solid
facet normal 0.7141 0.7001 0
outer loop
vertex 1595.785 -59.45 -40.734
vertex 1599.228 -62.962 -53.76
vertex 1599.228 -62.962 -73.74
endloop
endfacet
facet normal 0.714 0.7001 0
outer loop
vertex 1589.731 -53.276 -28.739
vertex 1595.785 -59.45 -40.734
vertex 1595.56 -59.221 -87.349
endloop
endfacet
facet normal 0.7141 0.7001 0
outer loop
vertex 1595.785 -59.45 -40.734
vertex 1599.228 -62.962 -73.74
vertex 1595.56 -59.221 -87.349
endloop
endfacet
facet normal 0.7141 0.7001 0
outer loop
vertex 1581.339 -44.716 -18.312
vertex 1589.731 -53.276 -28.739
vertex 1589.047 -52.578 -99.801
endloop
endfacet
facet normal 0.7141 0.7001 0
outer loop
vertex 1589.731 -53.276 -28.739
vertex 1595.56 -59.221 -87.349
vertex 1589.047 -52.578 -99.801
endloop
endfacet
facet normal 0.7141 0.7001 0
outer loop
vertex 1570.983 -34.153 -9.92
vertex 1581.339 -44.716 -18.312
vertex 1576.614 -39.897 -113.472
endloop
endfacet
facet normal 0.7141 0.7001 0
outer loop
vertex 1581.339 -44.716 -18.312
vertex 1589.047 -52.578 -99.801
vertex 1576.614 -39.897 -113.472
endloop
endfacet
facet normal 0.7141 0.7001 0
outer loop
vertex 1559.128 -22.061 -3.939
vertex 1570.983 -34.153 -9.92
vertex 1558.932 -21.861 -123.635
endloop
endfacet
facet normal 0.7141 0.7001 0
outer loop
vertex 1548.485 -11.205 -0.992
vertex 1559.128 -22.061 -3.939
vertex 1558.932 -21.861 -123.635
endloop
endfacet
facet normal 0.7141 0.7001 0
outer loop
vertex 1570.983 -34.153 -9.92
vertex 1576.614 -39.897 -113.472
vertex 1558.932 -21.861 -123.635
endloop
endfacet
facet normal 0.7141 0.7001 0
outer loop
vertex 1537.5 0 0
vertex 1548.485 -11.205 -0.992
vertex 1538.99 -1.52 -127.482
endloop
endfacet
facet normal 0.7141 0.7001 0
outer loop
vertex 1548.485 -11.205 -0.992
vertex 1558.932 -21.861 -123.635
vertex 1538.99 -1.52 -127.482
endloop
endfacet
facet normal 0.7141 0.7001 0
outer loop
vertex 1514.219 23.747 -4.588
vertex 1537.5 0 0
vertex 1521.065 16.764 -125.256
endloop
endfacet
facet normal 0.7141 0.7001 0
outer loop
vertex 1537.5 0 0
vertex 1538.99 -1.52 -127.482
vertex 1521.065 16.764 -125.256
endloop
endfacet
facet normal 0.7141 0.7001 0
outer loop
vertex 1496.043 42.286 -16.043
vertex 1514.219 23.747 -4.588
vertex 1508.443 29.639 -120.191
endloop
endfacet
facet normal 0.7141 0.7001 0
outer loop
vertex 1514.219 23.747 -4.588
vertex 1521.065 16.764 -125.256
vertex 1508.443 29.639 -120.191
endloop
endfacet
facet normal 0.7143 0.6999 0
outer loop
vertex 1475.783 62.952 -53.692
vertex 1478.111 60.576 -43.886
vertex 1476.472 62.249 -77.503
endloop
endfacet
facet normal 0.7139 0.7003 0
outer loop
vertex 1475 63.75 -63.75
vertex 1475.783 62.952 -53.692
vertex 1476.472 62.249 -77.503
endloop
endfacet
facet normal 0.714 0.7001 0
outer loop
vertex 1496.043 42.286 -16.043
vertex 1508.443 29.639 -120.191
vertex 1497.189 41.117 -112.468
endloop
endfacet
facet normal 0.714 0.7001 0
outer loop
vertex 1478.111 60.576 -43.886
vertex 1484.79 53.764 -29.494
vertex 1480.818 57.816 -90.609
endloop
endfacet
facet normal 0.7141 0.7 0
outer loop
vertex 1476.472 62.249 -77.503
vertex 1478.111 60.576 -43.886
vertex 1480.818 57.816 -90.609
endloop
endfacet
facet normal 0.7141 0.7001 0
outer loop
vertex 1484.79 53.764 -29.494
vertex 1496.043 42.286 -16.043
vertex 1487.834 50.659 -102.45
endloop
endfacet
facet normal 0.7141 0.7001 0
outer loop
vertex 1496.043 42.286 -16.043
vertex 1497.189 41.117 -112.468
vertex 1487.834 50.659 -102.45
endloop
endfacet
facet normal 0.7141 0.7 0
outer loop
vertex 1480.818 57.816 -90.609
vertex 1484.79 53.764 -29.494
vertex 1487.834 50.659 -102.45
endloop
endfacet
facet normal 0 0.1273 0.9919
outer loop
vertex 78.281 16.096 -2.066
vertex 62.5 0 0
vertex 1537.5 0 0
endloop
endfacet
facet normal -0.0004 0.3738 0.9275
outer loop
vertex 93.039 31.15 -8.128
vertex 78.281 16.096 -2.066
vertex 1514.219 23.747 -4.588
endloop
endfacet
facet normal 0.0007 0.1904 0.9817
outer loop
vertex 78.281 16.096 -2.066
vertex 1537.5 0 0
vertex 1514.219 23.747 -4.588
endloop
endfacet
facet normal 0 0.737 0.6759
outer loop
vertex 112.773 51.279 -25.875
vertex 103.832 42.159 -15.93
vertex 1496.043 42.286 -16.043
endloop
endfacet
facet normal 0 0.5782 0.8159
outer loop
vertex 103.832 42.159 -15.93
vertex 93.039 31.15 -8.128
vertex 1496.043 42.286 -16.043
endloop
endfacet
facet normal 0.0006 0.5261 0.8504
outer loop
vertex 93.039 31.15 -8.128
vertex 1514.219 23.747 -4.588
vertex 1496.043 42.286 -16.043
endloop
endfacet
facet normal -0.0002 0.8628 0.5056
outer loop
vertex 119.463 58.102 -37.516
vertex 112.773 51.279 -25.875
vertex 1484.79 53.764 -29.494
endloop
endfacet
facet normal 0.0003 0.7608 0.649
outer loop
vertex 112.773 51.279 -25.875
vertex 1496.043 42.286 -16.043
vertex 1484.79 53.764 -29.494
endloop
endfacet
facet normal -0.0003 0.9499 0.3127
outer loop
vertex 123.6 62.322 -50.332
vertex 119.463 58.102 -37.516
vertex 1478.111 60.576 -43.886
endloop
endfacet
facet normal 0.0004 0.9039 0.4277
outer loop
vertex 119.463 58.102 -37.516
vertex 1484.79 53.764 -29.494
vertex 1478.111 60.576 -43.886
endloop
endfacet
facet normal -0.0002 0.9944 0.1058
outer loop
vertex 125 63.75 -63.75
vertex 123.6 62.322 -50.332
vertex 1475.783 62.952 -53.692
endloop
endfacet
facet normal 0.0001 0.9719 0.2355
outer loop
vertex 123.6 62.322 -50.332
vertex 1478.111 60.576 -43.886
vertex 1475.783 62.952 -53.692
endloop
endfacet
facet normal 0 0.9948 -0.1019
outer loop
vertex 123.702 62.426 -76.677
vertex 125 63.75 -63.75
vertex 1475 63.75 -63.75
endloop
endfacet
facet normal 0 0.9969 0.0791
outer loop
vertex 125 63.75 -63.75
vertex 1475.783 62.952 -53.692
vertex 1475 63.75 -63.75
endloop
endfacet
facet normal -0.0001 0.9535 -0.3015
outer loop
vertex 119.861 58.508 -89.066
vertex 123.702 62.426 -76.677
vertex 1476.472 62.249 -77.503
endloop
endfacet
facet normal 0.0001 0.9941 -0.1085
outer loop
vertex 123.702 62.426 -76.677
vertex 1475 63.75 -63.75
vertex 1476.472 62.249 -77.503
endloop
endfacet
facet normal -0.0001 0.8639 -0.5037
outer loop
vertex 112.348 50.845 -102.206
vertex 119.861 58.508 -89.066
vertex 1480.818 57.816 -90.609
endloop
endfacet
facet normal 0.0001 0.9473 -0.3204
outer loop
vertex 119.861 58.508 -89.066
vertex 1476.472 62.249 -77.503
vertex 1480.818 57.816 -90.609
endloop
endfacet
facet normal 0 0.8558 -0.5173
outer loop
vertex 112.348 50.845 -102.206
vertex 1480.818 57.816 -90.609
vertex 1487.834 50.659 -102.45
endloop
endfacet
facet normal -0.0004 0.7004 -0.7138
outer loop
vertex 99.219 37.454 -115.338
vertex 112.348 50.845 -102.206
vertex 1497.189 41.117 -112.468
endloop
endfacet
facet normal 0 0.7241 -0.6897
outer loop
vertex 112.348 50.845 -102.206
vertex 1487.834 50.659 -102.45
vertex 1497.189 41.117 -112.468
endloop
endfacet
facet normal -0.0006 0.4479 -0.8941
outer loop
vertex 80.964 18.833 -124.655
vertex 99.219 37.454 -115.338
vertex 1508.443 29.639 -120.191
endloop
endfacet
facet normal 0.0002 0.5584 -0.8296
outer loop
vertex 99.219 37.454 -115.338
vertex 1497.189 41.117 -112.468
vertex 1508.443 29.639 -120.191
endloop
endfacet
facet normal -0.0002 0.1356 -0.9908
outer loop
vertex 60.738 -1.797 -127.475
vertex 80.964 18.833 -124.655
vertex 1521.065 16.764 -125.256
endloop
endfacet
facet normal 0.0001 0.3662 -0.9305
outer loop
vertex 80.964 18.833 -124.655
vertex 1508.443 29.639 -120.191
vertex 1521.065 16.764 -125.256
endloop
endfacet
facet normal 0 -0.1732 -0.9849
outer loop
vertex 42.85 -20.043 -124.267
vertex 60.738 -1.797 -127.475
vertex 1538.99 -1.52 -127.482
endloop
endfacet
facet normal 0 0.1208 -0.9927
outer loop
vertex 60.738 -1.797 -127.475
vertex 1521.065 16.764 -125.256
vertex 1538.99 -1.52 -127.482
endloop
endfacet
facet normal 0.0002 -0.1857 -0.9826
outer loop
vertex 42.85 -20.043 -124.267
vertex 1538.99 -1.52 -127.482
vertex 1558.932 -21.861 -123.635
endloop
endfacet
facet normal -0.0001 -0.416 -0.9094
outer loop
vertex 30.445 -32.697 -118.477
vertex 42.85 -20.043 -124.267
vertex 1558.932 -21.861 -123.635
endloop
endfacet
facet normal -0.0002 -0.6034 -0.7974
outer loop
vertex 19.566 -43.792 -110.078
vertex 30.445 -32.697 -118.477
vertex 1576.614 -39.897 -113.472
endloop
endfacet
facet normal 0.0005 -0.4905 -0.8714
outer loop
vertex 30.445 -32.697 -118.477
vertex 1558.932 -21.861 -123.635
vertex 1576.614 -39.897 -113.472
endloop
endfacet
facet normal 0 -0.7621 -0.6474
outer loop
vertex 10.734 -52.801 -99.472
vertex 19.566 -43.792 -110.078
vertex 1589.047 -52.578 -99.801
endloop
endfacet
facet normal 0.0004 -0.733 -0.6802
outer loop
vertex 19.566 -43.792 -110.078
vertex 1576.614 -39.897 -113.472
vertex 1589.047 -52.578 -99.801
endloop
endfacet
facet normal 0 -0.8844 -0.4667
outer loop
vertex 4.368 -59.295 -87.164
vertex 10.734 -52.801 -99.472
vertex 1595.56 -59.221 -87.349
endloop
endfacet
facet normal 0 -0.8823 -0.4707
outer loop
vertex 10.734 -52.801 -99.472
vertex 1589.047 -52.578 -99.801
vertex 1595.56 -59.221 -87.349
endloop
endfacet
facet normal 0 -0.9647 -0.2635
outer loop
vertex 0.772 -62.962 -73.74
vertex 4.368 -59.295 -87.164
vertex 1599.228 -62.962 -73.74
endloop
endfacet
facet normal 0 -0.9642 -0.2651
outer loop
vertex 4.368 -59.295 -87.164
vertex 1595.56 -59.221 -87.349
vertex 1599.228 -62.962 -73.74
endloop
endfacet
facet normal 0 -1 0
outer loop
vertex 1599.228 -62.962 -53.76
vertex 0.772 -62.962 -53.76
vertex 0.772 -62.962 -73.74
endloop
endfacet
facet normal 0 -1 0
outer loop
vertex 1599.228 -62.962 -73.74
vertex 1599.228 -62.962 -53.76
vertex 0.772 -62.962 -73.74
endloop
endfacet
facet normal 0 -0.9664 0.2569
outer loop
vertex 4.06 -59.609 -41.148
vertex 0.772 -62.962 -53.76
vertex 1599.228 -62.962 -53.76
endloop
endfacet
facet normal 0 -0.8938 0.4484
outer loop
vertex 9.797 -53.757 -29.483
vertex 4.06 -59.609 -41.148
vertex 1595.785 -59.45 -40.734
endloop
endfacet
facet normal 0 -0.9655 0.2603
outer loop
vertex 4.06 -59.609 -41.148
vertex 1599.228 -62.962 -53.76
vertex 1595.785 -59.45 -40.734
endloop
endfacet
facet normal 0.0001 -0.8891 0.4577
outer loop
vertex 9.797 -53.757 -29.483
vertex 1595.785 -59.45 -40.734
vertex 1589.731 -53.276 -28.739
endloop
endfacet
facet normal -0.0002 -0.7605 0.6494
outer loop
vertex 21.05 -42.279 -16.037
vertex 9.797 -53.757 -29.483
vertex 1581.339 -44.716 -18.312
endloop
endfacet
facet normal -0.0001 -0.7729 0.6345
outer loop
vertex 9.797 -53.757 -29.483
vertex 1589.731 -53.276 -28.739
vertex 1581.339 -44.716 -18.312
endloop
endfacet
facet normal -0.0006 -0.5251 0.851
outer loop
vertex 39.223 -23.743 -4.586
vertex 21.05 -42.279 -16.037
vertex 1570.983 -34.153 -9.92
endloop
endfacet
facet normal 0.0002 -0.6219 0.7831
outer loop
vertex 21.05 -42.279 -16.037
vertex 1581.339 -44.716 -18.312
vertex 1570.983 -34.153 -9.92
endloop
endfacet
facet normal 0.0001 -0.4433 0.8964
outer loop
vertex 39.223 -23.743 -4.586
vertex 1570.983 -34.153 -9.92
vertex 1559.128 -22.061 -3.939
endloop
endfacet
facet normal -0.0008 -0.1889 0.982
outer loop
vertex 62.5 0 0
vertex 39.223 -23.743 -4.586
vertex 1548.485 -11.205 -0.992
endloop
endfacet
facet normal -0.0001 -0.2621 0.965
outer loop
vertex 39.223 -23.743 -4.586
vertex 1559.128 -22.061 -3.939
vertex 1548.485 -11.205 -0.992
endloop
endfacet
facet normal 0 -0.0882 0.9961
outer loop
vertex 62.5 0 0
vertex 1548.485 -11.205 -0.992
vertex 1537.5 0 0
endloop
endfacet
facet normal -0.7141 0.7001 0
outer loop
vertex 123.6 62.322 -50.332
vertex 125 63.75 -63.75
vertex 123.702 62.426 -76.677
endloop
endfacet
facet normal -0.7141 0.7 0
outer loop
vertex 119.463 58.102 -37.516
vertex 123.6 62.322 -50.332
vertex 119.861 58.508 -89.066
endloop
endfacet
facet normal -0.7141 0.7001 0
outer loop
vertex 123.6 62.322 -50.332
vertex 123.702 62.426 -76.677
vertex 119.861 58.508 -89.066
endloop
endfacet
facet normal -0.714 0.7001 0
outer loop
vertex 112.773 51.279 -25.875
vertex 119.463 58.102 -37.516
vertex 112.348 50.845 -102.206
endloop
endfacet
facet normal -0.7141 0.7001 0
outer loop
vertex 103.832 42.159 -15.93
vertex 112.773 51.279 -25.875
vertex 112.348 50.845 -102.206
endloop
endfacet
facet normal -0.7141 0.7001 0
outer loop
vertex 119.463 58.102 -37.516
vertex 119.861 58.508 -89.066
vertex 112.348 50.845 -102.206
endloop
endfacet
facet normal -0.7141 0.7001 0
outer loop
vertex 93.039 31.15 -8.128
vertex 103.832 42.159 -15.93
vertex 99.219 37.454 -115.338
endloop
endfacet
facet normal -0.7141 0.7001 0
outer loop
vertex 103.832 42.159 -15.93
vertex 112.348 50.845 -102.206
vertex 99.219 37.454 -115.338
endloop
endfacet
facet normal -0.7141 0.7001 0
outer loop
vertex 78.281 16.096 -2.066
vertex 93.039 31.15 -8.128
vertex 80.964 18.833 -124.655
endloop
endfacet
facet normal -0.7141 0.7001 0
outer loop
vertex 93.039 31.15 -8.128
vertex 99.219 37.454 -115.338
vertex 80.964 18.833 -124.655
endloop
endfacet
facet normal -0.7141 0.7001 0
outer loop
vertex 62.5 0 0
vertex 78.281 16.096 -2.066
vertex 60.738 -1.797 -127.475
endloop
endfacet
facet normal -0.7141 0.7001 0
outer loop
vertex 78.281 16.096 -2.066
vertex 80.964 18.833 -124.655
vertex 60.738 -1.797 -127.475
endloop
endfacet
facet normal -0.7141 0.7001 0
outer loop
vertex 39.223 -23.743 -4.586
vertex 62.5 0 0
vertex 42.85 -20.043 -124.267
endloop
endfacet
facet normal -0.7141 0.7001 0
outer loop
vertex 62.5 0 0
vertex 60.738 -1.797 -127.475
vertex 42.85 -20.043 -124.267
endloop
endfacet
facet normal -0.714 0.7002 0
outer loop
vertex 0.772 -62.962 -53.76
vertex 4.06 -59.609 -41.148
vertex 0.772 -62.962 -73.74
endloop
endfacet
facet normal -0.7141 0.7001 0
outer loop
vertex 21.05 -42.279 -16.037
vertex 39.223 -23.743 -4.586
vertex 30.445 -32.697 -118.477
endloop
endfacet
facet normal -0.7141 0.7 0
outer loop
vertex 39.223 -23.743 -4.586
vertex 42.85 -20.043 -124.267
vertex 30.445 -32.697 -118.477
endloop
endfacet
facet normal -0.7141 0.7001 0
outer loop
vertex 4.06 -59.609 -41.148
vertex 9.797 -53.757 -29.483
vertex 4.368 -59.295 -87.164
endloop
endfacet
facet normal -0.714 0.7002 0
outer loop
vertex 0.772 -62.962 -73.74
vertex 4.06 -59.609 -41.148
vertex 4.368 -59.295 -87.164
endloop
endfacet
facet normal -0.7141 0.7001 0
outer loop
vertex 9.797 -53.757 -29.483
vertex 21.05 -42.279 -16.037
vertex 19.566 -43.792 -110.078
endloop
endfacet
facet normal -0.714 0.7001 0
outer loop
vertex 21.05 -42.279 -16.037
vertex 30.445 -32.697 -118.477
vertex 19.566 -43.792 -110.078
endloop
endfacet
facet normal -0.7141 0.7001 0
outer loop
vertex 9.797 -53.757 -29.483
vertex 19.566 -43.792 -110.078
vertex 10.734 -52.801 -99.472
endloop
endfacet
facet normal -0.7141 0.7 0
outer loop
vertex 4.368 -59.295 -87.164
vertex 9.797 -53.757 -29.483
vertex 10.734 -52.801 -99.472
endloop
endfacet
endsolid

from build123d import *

# Parameters (mm, degrees)
SKETCH2_W               = 1600
SKETCH2_H               = 63.75
CUT_EXTRUDE2_DEPTH      = 1607.337546252
CUT_EXTRUDE2_DEPTH_BACK = 1607.337546252
CUT_EXTRUDE3_DEPTH      = 1607.337546252


with BuildPart() as part:
    # Sketch2 → Revolve1 (revolve)
    with BuildSketch(Plane(origin=(0, 0, 0), x_dir=(1, 0, 0), z_dir=(0, 1, 0))):
        with Locations((800, 31.875)):
            Rectangle(SKETCH2_W, SKETCH2_H)
    revolve(axis=Axis((1600, 0, -63.75), (-1, 0, 0)))

    # Sketch3 → Cut-Extrude2 (cut, two sides: drawn at the far end of the back side and taken through both)
    with BuildSketch(Plane.XY.offset(-CUT_EXTRUDE2_DEPTH_BACK)):
        Polygon((0, 63.75), (125, 63.75), (0, -63.75), align=None)
        Polygon((1600, 63.75), (1600, -63.75), (1475, 63.75), align=None)
    extrude(amount=CUT_EXTRUDE2_DEPTH + CUT_EXTRUDE2_DEPTH_BACK, mode=Mode.SUBTRACT)

    # Sketch5 → Cut-Extrude3 (cut, through all)
    with BuildSketch(Plane(origin=(0, 0, 0), x_dir=(0, 0, -1), z_dir=(1, 0, 0))):
        Polygon((63.75, -63.75), (0, -63.75), (0, -62.96232629), (127.5, -62.96232629), (127.5, -63.75), align=None)
    extrude(amount=CUT_EXTRUDE3_DEPTH, mode=Mode.SUBTRACT)


solid = part.part
